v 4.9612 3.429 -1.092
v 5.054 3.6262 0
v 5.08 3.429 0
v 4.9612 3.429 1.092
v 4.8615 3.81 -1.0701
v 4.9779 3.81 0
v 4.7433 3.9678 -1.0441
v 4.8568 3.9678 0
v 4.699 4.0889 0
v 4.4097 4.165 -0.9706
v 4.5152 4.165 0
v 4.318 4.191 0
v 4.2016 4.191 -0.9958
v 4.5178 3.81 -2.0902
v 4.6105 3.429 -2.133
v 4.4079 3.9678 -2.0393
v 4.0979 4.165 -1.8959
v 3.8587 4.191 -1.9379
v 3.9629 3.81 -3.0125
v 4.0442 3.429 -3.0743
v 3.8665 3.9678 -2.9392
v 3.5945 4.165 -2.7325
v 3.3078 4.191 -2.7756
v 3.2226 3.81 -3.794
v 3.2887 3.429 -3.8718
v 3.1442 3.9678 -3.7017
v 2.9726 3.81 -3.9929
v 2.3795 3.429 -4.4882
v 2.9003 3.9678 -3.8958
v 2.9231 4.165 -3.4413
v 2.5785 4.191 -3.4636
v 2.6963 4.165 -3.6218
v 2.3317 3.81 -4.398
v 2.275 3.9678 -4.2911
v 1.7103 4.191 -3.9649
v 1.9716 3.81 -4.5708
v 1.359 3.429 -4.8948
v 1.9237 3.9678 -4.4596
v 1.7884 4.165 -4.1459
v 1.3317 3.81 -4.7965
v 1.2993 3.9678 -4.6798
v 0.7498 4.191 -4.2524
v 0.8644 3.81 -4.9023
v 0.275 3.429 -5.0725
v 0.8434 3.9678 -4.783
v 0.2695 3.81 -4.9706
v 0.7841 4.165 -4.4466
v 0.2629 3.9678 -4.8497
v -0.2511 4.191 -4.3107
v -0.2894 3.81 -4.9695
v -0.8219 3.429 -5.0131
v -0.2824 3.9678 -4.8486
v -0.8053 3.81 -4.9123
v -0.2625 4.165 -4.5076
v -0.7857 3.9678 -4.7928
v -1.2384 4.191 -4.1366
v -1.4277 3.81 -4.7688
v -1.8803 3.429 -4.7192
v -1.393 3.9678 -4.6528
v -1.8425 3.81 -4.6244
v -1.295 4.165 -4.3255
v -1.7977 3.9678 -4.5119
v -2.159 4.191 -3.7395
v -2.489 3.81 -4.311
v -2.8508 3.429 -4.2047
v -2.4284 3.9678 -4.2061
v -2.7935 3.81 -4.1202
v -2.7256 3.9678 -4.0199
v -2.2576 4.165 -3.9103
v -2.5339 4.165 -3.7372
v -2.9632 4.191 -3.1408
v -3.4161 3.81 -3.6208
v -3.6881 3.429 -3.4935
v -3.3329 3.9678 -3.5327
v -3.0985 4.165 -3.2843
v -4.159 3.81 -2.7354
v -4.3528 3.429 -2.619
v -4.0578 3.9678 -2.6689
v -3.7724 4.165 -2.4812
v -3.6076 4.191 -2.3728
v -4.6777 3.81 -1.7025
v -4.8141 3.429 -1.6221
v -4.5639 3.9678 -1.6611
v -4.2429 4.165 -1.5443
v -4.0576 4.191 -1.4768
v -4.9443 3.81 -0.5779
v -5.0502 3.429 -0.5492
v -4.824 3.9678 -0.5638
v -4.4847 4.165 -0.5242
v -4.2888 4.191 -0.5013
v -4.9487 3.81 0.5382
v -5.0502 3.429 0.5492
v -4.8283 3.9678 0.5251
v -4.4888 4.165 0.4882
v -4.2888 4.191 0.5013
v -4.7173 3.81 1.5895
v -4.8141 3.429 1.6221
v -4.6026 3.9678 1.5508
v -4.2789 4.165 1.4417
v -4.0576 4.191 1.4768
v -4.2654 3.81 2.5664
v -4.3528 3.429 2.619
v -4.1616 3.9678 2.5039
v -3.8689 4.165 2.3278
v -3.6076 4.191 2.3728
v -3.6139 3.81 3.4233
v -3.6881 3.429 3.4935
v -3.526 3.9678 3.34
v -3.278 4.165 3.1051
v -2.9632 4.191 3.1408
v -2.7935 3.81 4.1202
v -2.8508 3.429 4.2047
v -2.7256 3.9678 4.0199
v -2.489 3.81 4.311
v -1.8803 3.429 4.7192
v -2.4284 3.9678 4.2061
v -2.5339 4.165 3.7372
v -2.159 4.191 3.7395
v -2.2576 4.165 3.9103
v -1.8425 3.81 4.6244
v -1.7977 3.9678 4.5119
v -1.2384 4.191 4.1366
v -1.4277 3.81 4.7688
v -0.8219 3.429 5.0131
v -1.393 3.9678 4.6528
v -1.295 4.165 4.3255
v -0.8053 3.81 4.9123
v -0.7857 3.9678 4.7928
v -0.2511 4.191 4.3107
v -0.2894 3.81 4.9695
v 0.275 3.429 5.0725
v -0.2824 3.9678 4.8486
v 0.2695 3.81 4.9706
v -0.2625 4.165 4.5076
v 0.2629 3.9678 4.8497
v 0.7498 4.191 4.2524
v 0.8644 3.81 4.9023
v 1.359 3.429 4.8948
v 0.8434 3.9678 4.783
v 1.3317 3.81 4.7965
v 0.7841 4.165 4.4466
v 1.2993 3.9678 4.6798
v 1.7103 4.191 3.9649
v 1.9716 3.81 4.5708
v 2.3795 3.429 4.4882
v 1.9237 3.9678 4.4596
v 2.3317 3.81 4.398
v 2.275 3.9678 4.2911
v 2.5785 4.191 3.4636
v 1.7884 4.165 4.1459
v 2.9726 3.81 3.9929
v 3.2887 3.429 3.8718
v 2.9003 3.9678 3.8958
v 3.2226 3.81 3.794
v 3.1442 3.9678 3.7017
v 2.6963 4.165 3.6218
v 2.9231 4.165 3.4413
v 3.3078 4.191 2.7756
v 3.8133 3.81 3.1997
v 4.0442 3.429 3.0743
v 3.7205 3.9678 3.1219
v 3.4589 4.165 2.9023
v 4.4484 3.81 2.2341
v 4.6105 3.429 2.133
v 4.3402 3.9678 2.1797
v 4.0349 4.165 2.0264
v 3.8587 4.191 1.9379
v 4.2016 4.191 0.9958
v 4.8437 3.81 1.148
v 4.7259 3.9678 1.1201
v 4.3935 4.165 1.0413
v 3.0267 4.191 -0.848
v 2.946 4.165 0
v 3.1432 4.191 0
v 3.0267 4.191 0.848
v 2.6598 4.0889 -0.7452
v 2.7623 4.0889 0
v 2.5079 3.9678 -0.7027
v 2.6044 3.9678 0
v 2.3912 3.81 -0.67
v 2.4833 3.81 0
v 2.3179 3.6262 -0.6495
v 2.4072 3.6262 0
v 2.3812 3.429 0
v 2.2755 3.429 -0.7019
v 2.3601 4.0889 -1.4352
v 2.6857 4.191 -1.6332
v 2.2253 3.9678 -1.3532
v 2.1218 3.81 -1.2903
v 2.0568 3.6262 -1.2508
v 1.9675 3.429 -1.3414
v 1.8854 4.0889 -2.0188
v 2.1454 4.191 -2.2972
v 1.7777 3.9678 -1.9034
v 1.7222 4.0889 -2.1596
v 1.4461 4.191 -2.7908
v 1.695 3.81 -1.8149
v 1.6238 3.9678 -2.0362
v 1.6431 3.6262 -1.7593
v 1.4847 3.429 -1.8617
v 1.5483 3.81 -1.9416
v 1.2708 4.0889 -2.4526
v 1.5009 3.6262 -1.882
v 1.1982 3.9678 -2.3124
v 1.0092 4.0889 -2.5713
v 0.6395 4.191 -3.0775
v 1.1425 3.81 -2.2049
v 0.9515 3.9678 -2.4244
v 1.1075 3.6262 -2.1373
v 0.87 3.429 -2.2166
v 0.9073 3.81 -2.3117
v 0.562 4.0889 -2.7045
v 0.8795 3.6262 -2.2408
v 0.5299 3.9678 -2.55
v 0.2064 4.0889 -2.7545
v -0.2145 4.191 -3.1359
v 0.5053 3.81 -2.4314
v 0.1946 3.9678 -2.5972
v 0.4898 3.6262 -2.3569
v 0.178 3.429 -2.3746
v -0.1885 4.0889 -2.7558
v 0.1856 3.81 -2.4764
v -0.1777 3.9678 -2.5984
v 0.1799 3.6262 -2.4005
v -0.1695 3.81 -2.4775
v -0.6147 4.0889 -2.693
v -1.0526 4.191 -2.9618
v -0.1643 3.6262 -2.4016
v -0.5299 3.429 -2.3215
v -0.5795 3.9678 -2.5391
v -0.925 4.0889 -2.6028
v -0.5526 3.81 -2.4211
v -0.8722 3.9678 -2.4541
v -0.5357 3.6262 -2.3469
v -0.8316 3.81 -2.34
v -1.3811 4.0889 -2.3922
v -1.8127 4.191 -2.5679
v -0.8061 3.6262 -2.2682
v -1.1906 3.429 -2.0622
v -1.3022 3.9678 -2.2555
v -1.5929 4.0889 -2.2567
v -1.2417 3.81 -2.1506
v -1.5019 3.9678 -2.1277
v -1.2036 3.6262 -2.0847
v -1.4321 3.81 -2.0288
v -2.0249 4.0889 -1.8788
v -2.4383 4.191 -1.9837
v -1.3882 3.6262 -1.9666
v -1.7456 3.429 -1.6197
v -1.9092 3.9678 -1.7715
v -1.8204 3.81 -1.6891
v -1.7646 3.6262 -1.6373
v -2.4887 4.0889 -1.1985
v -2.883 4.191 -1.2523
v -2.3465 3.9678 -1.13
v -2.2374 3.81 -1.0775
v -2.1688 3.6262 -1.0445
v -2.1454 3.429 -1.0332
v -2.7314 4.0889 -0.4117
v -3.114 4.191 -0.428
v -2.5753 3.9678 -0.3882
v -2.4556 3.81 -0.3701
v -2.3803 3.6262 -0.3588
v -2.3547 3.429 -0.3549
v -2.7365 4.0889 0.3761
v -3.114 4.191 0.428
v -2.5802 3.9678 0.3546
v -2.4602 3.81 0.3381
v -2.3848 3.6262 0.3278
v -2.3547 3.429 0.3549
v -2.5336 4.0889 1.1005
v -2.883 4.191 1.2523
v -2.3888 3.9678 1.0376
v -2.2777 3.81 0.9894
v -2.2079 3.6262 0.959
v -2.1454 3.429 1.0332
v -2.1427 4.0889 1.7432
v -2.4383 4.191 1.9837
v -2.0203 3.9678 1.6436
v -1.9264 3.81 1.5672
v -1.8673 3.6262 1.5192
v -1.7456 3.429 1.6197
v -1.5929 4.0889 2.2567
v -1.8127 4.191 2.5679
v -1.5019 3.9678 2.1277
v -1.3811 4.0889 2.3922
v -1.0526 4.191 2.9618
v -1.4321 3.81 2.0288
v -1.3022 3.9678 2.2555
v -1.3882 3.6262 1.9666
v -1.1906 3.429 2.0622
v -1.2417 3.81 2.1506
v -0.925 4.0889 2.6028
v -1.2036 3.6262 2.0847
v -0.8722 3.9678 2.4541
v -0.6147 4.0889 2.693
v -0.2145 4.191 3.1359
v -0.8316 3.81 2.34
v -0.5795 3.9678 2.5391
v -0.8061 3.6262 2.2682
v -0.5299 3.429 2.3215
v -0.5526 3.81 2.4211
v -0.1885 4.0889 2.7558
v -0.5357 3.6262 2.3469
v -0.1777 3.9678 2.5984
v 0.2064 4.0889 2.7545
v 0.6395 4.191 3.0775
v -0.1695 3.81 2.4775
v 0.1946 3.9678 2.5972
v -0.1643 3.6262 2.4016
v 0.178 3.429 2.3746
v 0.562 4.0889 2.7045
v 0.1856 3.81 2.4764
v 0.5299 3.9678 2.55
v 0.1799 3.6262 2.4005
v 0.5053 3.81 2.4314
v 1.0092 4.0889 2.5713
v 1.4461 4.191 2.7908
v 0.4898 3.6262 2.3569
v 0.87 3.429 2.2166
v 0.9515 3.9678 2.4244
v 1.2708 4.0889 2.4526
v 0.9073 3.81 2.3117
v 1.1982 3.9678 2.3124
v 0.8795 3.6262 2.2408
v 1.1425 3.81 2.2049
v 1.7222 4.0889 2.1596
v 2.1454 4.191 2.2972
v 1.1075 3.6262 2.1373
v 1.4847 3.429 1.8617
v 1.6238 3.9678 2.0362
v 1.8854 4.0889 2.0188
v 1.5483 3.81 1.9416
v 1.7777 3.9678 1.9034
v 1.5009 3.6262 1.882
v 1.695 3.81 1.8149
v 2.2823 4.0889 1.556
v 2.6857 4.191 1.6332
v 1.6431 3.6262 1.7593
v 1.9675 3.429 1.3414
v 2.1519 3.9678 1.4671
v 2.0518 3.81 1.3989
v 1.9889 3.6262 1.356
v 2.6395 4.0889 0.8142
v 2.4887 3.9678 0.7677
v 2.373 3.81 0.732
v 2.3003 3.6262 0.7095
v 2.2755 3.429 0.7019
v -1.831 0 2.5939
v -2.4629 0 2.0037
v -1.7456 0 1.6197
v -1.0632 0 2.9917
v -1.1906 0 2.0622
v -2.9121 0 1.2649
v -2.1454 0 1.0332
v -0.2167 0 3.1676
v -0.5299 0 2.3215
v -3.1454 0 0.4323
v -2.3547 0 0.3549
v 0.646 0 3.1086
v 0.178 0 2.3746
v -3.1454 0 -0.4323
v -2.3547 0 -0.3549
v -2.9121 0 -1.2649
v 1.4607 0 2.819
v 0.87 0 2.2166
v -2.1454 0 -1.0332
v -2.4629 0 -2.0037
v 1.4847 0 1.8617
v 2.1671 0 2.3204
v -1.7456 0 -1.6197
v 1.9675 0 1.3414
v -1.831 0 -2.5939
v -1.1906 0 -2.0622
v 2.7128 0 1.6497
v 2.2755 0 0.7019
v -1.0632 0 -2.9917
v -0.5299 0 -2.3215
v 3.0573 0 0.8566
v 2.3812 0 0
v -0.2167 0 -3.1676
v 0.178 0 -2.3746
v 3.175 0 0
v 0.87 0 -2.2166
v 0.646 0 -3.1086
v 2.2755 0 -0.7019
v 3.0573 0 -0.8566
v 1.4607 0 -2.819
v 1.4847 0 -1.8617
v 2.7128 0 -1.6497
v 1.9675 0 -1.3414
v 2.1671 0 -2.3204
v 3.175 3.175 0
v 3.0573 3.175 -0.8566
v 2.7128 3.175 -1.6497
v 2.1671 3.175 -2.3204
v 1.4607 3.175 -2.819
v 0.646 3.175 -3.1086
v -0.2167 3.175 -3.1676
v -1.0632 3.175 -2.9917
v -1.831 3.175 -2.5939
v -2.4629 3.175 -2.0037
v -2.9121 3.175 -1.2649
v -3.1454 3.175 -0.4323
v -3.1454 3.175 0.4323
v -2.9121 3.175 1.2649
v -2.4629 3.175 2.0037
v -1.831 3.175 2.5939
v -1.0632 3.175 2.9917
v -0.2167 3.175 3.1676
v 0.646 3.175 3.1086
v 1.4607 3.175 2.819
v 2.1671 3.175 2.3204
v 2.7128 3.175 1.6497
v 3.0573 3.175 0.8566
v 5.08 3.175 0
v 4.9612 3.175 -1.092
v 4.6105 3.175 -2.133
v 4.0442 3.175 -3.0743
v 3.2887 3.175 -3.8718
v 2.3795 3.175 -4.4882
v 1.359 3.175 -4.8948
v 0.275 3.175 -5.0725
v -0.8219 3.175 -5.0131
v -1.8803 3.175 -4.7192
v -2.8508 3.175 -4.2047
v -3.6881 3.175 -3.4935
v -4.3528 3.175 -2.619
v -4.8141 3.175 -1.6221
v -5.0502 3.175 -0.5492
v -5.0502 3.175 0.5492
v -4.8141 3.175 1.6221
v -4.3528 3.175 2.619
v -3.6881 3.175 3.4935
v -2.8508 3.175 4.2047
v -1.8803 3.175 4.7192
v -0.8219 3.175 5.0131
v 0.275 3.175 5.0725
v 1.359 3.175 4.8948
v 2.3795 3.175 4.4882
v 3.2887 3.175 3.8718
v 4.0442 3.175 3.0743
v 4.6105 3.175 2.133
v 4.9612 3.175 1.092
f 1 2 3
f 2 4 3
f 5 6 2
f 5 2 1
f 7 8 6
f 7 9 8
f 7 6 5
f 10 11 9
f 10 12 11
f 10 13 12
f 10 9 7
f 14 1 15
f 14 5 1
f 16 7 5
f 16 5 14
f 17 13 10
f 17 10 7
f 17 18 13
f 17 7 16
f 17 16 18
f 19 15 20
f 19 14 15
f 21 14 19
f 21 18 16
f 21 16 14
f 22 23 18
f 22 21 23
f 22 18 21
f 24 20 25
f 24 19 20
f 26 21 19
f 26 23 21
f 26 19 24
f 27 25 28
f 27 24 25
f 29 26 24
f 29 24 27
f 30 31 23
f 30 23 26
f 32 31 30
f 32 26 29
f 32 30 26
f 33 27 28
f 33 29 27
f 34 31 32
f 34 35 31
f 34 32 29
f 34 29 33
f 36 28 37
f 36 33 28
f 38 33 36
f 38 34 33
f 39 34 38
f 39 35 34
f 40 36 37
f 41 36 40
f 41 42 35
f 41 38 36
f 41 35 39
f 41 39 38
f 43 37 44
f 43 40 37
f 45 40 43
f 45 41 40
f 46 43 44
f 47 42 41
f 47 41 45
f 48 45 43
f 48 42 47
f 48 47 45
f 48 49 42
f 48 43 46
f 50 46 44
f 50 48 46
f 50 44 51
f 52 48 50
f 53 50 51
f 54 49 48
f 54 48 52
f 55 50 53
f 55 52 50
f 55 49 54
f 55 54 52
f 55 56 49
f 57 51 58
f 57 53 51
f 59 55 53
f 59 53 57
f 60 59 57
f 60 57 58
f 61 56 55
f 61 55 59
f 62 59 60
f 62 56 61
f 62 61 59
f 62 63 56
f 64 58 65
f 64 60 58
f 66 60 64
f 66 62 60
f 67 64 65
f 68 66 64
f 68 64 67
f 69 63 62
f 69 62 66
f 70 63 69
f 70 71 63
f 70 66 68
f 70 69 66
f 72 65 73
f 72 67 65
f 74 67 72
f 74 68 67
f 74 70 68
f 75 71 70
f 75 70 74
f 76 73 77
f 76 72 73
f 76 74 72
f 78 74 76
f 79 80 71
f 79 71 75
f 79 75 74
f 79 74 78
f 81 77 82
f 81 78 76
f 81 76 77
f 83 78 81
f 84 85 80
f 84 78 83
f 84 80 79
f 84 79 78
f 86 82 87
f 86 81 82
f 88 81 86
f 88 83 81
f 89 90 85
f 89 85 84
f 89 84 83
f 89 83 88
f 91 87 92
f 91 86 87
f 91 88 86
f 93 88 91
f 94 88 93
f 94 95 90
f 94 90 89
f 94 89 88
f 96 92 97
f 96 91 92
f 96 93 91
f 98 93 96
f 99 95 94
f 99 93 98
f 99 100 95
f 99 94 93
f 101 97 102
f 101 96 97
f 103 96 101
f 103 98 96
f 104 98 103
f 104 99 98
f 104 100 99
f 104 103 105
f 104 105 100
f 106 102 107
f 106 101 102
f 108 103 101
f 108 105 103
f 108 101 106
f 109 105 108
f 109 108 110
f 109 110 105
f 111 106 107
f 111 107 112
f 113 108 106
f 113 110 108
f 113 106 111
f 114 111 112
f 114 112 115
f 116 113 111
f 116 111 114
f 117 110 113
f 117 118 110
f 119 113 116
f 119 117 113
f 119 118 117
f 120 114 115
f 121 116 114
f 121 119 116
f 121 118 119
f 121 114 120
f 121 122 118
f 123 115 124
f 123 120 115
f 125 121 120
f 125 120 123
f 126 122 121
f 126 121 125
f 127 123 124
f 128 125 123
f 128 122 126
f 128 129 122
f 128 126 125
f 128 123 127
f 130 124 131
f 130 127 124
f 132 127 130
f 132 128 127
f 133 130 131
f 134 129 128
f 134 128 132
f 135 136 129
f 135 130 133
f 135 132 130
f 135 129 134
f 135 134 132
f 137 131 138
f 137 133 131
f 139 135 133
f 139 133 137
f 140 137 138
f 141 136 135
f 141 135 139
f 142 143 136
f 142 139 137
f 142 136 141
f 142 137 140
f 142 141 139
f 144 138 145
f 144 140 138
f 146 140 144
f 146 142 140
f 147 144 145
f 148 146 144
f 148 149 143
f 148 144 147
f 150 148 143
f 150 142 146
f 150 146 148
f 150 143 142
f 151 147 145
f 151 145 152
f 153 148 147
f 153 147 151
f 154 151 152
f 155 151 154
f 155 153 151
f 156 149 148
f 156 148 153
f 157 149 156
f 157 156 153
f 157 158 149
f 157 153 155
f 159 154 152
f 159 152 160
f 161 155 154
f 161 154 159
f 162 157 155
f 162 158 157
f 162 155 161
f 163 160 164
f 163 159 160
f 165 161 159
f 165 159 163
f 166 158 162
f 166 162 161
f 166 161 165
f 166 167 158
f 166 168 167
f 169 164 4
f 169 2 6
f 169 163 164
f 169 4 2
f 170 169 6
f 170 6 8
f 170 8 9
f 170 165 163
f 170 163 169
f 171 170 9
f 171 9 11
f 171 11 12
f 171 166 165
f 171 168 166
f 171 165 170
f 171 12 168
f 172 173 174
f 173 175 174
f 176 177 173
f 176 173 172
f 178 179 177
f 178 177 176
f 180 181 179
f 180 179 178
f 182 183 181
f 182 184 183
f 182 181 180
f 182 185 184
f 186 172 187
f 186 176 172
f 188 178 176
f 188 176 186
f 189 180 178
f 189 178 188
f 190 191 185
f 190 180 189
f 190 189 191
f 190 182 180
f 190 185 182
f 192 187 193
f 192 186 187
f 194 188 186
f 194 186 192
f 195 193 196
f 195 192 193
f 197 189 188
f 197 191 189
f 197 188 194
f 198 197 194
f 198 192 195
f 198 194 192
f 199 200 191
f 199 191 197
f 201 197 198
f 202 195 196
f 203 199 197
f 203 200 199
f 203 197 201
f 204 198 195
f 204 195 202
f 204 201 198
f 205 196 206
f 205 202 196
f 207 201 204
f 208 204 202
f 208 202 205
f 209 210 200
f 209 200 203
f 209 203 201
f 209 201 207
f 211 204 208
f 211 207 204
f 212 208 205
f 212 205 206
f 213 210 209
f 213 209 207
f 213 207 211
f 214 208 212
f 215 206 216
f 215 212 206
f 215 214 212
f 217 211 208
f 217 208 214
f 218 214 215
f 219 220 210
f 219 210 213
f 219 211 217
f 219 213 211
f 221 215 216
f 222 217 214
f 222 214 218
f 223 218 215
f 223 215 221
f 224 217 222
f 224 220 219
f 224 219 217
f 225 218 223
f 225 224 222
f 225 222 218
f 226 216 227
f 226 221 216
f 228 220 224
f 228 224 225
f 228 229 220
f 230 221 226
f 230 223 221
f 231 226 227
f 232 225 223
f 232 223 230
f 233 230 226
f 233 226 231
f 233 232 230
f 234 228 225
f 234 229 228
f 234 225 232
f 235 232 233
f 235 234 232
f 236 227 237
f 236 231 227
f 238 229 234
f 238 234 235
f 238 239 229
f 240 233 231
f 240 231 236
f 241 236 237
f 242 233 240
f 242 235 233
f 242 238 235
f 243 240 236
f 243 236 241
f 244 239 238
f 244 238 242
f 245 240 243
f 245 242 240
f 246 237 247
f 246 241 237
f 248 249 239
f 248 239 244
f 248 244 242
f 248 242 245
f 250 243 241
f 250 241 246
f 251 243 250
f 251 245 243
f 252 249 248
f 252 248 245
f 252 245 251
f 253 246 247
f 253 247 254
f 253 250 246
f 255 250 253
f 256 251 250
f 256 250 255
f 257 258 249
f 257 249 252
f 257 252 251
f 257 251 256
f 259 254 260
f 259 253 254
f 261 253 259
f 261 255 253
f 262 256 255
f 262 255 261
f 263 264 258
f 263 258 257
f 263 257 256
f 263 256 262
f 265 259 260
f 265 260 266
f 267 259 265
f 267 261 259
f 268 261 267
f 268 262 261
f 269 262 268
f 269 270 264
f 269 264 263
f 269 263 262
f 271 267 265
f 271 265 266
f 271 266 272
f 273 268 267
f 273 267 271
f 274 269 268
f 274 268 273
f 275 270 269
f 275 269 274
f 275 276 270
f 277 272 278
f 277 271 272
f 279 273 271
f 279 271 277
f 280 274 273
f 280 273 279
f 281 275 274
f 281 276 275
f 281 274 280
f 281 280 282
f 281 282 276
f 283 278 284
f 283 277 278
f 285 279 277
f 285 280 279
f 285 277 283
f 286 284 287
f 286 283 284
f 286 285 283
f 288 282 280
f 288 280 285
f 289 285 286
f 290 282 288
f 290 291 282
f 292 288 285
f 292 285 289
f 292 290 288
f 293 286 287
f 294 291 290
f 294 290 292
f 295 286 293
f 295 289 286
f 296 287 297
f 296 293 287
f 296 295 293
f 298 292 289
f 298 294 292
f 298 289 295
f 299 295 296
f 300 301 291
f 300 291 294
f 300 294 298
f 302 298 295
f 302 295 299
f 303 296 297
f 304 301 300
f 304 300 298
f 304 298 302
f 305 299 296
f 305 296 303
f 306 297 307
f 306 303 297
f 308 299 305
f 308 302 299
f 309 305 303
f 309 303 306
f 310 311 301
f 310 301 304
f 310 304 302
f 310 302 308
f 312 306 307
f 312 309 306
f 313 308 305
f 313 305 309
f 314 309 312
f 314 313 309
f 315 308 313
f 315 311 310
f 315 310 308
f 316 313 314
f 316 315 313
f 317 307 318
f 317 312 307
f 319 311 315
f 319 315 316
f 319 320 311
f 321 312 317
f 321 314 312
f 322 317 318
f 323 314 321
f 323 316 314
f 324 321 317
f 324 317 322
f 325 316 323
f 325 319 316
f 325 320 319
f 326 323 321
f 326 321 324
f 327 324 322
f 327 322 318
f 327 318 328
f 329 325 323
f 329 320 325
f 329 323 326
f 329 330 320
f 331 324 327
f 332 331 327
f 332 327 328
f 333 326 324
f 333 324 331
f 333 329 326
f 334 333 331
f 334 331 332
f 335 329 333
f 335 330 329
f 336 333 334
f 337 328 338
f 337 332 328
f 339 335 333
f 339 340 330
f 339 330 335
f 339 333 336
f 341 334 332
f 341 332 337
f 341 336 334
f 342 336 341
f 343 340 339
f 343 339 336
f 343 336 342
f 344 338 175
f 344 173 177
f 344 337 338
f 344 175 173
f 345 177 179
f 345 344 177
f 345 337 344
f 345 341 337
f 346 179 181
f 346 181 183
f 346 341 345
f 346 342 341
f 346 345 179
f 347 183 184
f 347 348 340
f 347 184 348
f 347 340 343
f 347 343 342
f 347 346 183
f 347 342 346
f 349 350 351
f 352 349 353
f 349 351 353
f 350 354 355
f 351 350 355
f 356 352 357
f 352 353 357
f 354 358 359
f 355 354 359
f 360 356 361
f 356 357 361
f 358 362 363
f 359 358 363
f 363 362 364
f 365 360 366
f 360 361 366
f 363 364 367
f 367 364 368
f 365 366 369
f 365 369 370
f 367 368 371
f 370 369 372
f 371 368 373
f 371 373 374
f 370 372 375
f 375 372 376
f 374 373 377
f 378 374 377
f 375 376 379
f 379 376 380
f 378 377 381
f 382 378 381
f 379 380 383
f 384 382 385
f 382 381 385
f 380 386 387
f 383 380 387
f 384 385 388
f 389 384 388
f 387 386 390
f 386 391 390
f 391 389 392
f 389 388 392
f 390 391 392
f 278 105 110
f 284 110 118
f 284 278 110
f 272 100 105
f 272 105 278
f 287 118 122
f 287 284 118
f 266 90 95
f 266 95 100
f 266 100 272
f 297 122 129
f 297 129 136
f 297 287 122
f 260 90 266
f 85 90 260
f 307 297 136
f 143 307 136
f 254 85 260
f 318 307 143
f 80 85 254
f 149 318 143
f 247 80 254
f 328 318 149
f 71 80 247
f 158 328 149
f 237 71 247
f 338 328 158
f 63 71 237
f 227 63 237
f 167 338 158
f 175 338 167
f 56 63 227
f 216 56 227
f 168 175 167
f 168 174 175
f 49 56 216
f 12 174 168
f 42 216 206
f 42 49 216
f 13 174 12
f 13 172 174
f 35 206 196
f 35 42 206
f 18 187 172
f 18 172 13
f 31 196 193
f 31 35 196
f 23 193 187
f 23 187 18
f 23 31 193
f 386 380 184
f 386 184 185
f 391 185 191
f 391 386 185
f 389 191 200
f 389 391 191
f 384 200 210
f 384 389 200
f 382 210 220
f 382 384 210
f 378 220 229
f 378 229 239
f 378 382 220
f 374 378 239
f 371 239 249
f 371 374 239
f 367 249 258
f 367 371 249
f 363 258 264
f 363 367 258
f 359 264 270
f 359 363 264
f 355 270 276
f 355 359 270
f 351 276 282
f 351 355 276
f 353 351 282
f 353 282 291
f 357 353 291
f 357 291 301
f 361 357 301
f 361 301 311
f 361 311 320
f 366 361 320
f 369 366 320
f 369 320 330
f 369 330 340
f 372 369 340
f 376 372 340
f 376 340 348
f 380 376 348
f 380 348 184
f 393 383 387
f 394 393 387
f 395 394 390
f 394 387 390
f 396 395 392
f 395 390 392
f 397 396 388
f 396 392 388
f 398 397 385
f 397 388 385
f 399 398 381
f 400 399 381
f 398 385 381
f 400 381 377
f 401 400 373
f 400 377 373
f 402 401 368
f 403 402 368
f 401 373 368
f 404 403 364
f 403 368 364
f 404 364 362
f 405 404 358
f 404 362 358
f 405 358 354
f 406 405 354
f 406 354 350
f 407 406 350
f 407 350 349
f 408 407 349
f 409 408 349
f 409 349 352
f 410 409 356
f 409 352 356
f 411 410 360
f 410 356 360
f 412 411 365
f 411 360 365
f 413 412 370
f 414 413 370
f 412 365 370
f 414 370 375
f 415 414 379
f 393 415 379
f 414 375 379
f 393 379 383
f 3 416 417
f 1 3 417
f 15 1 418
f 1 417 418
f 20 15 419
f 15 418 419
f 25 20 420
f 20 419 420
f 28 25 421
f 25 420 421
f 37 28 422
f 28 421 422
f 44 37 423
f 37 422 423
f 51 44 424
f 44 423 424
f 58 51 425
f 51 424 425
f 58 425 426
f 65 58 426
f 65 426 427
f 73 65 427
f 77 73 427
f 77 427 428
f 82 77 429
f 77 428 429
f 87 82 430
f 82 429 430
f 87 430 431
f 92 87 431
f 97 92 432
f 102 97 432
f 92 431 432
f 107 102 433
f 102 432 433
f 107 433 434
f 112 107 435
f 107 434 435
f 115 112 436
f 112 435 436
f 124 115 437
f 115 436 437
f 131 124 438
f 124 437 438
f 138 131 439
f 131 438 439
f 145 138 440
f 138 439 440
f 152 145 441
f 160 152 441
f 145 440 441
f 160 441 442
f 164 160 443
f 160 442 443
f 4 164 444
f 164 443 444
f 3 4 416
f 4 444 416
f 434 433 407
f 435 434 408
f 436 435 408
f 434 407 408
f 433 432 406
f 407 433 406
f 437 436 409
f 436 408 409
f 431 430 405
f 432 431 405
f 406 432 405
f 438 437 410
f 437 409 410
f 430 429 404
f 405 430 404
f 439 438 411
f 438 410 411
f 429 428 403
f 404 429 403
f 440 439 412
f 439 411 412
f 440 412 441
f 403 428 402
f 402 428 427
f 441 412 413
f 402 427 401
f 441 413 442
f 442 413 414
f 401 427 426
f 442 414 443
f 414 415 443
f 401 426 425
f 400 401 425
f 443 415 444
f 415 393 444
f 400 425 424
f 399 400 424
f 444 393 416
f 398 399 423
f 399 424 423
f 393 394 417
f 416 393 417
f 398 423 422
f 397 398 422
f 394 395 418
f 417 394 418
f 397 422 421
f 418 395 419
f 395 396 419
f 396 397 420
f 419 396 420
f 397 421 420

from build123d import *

# Parameters (mm, degrees)
SKETCH1_R           = 3.175
SKETCH1_R_2         = 2.38125
BOSS_EXTRUDE1_DEPTH = 3.175
SKETCH2_R           = 5.08
SKETCH2_R_2         = 2.38125
BOSS_EXTRUDE2_DEPTH = 1.016
FILLET1_R           = 0.762


with BuildPart() as part:
    # Sketch1 → Boss-Extrude1 (new body)
    with BuildSketch(Plane(origin=(0, 0, 0), x_dir=(1, 0, 0), z_dir=(0, 1, 0))):
        Circle(SKETCH1_R)
        Circle(SKETCH1_R_2, mode=Mode.SUBTRACT)
    extrude(amount=BOSS_EXTRUDE1_DEPTH)

    # Sketch2 → Boss-Extrude2 (add)
    with BuildSketch(Plane(origin=(0, 3.175, 0), x_dir=(1, 0, 0), z_dir=(0, 1, 0))):
        Circle(SKETCH2_R)
        Circle(SKETCH2_R_2, mode=Mode.SUBTRACT)
    extrude(amount=BOSS_EXTRUDE2_DEPTH)

    # Fillet1
    fillet1_edges = [part.edges().sort_by_distance(p)[0] for p in [
        (-2.38125, 4.191, 0),
        (-5.08, 4.191, 0),
    ]]
    fillet(fillet1_edges, radius=FILLET1_R)


solid = part.part
